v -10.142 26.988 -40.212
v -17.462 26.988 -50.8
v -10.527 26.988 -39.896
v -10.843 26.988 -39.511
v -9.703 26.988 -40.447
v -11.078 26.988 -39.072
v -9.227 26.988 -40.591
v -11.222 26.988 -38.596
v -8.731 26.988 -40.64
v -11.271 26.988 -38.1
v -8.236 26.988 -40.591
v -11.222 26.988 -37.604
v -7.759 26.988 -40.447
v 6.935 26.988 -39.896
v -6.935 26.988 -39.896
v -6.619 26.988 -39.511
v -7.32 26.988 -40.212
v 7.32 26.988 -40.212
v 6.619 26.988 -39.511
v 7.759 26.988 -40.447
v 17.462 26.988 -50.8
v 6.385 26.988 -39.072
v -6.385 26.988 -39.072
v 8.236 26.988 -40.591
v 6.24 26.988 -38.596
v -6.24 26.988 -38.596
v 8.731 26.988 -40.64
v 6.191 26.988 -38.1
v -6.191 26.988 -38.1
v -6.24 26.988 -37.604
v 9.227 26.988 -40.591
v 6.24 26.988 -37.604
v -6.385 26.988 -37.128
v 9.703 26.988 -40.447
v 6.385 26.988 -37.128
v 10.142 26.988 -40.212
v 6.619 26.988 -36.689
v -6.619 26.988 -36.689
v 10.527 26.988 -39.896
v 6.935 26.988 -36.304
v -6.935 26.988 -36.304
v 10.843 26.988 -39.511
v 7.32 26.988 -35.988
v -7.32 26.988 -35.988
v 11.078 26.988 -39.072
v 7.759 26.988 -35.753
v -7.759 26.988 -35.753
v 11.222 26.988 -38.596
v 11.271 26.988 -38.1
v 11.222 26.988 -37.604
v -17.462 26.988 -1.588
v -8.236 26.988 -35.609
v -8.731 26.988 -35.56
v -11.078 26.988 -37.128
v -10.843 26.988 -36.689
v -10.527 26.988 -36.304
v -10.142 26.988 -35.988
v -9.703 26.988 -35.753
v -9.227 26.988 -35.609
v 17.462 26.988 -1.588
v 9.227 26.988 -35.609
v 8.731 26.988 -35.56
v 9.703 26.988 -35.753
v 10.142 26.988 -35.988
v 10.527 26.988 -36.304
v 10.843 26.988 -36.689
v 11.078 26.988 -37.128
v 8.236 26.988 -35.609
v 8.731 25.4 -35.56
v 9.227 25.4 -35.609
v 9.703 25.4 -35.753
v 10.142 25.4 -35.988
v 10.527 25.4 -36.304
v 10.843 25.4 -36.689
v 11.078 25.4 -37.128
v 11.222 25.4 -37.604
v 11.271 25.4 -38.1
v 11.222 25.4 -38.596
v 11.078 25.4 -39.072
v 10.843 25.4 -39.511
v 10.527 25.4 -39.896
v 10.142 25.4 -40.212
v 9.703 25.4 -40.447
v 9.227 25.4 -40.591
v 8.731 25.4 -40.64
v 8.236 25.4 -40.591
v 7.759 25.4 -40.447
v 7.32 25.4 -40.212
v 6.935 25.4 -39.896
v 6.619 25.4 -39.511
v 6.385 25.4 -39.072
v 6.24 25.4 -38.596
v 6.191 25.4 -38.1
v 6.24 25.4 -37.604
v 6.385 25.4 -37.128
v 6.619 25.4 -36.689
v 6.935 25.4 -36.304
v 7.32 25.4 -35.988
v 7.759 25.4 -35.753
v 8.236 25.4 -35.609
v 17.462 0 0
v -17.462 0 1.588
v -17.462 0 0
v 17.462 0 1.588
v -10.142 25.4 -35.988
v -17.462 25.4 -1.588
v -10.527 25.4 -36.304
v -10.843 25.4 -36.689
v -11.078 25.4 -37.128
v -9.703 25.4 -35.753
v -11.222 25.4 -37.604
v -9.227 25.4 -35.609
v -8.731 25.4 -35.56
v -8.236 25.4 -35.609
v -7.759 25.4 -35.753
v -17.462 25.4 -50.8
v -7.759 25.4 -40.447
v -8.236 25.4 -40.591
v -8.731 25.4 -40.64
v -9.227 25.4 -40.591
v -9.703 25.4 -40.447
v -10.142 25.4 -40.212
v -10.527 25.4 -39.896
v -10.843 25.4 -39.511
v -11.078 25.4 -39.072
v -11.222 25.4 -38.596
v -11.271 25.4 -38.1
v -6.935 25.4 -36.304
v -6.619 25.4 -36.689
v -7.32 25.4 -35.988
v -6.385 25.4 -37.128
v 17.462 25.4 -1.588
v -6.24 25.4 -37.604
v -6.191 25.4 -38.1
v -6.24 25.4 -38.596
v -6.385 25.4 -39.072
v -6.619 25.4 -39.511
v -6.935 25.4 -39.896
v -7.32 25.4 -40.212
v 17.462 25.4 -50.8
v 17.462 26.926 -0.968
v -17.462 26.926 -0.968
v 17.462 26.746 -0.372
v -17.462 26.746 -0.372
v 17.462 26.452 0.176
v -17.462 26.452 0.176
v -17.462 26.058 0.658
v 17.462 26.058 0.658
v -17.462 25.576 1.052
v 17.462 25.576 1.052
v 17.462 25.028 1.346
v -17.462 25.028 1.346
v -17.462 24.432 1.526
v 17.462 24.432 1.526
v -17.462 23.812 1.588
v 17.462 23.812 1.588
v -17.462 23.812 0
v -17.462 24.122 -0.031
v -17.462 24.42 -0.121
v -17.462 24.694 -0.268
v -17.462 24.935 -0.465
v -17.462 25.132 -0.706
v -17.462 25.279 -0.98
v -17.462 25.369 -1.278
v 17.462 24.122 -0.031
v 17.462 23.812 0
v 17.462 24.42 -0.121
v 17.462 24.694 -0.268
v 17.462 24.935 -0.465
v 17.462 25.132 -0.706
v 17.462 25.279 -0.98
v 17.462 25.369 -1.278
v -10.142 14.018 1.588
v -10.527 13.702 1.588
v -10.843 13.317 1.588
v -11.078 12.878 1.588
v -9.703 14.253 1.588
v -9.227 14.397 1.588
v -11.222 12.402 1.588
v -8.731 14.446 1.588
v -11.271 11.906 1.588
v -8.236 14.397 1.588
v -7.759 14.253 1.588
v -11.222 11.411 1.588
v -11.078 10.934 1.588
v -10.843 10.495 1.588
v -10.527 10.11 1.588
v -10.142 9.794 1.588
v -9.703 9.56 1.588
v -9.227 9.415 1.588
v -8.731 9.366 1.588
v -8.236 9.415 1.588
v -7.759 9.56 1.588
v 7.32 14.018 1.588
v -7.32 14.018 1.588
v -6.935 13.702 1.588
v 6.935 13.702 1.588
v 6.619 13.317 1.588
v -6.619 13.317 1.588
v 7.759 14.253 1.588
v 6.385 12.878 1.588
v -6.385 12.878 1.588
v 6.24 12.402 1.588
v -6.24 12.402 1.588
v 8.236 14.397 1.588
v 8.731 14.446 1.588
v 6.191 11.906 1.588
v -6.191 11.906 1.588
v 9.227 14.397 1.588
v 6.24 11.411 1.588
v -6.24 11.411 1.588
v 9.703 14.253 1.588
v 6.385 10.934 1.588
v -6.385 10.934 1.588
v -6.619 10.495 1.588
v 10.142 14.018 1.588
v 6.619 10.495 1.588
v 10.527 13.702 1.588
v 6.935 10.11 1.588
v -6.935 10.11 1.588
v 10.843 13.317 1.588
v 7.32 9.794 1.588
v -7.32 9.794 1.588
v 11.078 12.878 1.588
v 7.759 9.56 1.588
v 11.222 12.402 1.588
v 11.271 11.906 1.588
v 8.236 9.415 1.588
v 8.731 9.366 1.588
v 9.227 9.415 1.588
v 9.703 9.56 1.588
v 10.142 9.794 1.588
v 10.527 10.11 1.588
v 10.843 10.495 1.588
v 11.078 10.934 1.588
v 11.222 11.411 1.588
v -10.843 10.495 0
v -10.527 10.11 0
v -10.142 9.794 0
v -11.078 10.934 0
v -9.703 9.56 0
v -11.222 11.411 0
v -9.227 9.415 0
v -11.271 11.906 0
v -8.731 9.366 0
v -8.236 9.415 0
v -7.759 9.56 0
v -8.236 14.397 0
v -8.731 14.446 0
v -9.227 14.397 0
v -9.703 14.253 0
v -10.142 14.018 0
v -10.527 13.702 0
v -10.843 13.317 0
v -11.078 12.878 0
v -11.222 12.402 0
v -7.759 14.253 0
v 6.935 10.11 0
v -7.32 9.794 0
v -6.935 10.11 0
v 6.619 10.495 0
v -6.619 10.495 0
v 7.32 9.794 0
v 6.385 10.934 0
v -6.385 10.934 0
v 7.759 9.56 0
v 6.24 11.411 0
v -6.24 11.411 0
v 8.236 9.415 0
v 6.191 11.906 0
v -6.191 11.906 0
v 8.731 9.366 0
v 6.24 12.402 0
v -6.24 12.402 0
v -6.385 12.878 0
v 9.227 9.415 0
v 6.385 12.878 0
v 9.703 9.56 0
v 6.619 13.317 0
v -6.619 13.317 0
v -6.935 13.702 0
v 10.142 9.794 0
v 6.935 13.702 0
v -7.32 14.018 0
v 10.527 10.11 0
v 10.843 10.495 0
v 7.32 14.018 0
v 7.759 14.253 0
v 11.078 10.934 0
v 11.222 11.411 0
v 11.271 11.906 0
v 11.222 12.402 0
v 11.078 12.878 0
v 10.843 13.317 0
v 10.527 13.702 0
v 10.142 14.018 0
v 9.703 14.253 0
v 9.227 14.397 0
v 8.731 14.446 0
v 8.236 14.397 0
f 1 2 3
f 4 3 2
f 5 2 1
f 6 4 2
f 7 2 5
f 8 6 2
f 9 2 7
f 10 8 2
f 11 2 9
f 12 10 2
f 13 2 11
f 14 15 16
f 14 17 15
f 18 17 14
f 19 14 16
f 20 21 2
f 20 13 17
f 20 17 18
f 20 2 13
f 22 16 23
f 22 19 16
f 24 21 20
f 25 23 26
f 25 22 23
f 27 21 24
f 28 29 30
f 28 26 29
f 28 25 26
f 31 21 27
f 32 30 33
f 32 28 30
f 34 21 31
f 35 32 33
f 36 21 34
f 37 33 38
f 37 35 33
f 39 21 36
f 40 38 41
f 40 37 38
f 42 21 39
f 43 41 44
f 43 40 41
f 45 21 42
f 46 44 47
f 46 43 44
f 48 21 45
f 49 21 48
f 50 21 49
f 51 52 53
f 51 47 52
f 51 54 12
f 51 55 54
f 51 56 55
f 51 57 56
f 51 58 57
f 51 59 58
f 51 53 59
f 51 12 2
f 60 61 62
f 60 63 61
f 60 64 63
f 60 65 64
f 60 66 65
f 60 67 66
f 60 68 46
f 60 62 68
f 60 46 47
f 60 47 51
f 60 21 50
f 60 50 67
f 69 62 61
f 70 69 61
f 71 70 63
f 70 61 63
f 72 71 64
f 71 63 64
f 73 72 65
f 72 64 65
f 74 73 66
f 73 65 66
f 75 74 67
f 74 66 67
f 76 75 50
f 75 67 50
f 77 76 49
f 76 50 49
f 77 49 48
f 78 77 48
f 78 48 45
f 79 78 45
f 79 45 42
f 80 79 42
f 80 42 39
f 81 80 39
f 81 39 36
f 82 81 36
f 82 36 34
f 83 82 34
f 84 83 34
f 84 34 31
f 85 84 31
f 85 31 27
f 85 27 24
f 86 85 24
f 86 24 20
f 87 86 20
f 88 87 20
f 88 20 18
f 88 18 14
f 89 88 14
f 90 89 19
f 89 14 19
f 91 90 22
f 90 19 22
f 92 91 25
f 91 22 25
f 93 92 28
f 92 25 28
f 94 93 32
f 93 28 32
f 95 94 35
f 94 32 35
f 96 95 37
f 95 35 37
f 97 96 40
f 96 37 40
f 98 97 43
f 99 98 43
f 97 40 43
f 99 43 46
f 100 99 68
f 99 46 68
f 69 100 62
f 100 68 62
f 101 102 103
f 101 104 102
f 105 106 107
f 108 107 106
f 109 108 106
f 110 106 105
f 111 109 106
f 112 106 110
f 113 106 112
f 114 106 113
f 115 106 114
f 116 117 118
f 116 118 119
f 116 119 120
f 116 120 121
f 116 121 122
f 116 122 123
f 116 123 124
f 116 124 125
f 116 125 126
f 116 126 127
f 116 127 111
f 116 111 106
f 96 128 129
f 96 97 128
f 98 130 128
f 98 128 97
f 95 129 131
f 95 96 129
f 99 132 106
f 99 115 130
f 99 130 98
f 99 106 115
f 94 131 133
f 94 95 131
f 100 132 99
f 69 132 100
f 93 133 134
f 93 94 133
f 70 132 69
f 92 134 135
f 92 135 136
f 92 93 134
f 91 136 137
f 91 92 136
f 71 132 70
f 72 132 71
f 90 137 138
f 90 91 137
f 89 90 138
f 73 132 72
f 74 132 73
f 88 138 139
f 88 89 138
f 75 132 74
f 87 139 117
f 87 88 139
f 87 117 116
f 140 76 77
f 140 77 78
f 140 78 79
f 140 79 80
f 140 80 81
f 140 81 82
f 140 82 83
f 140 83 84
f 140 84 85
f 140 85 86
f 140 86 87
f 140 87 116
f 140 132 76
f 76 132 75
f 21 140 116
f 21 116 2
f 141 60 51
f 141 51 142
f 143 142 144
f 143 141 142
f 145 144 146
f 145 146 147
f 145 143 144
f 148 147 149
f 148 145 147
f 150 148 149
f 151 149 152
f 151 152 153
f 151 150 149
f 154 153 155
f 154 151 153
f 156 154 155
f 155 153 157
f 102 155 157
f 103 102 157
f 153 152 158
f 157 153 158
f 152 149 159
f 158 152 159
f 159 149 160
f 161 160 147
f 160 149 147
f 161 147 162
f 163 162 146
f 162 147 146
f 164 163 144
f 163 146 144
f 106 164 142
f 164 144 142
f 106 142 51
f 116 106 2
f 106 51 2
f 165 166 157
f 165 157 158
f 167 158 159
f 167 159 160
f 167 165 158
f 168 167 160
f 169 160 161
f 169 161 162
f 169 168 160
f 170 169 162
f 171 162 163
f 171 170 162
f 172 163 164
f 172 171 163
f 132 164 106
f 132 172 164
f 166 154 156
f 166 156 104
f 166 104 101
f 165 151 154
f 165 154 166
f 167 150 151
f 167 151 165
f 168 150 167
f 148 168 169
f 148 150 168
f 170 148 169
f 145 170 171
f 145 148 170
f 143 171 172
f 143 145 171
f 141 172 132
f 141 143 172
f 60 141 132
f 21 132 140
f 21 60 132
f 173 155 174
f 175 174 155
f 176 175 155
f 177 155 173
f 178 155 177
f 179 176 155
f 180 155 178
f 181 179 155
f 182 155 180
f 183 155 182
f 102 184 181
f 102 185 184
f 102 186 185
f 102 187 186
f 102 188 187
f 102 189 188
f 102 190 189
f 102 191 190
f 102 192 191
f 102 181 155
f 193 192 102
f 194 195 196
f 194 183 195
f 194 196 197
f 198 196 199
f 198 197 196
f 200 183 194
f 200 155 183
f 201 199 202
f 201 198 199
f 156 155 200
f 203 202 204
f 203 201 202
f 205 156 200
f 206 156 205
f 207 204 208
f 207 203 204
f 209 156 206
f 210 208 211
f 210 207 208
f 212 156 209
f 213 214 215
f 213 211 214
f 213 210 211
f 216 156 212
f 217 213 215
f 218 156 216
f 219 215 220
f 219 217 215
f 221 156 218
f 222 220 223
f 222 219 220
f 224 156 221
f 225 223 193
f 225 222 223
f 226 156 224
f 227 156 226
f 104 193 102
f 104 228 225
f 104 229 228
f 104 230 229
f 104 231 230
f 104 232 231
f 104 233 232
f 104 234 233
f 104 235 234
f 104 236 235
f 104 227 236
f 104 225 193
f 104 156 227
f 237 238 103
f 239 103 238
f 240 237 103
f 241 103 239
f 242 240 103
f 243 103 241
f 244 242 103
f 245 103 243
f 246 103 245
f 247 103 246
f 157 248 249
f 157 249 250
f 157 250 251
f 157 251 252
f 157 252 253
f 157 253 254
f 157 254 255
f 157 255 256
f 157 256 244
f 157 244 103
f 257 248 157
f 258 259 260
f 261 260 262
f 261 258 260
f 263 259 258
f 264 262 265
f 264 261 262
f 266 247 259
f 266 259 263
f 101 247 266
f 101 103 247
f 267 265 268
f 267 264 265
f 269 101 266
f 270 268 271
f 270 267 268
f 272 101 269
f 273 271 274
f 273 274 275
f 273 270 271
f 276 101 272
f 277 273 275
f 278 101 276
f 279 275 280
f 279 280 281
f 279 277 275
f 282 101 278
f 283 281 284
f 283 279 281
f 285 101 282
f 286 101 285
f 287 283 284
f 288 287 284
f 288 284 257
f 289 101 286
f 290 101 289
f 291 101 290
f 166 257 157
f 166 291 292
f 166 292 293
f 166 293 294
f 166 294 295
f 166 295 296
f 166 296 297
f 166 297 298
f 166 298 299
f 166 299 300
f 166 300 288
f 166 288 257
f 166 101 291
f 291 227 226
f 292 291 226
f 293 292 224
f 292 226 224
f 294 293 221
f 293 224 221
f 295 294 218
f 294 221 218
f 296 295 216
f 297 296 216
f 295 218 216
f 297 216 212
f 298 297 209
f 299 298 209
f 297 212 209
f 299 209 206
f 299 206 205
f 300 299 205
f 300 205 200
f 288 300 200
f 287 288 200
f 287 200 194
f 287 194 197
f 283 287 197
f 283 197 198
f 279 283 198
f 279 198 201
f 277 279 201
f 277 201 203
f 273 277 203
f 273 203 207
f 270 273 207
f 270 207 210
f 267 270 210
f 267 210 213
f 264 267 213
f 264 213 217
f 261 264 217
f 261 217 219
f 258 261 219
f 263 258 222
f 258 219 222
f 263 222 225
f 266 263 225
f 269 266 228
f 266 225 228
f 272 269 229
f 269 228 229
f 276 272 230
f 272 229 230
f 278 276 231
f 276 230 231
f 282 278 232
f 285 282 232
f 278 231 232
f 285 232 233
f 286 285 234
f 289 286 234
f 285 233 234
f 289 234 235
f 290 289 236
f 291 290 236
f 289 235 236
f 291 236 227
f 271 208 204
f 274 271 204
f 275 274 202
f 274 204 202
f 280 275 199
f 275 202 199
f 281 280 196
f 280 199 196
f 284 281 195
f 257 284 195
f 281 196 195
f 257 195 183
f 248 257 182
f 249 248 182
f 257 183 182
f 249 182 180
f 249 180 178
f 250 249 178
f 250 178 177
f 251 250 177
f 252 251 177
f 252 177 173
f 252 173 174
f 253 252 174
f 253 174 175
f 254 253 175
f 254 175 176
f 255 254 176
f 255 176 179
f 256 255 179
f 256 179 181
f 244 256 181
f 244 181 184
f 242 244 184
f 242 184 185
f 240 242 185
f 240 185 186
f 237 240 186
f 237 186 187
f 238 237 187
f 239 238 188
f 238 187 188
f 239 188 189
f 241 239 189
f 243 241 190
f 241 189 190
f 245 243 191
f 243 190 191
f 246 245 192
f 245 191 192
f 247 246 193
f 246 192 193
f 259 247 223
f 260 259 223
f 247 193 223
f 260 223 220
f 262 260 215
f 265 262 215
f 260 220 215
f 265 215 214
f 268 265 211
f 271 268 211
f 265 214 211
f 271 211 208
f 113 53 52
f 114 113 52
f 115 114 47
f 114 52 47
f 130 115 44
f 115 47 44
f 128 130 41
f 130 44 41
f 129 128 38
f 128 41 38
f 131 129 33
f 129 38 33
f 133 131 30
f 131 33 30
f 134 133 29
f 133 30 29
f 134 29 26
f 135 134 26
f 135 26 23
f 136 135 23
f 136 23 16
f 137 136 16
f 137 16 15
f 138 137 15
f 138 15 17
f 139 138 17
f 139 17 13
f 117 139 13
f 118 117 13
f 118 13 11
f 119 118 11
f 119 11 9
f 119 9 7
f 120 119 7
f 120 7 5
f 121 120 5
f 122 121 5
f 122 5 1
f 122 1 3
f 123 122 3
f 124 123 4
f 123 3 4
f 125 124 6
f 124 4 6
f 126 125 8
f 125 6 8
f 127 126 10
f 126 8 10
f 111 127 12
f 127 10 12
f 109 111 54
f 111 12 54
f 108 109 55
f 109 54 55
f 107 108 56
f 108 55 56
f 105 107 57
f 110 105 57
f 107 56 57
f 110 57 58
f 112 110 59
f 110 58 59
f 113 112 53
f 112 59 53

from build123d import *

# Parameters (mm, degrees)
BASE_FLANGE1_DEPTH = 17.4625
SKETCH6_R          = 2.54
CUT_EXTRUDE1_DEPTH = 2.54
SKETCH7_R          = 2.54
CUT_EXTRUDE2_DEPTH = 2.54


# Sheet-metal steps are written as plain solids
with BuildPart() as part:
    # Sketch1 → Base-Flange1 (new, symmetric)
    with BuildSketch(Plane(origin=(0, 0, 0), x_dir=(0, 0, -1), z_dir=(1, 0, 0))):
        with BuildLine():
            Line((0, 0), (0, 23.8125))
            ThreePointArc((0, 23.8125), (0.464967985, 24.935032015), (1.5875, 25.4))
            Line((1.5875, 25.4), (50.8, 25.4))
            Line((50.8, 25.4), (50.8, 26.9875))
            Line((50.8, 26.9875), (1.5875, 26.9875))
            ThreePointArc((1.5875, 26.9875), (-0.65756403, 26.05756403), (-1.5875, 23.8125))
            Line((-1.5875, 23.8125), (-1.5875, 0))
            Line((-1.5875, 0), (0, 0))
        make_face()
    extrude(amount=BASE_FLANGE1_DEPTH, both=True)

    # Sketch6 → Cut-Extrude1 (cut)
    with BuildSketch(Plane.XY.offset(1.5875)):
        with Locations((-8.73125, 11.90625)):
            Circle(SKETCH6_R)
        with Locations((8.73125, 11.90625)):
            Circle(SKETCH6_R)
    extrude(amount=-CUT_EXTRUDE1_DEPTH, mode=Mode.SUBTRACT)

    # Sketch7 → Cut-Extrude2 (cut)
    with BuildSketch(Plane(origin=(0, 26.9875, 0), x_dir=(1, 0, 0), z_dir=(0, 1, 0))):
        with Locations(Location((-8.73125, 38.1, 0), (0, 0, 270))):
            Circle(SKETCH7_R)
        with Locations(Location((8.73125, 38.1, 0), (0, 0, 270))):
            Circle(SKETCH7_R)
    extrude(amount=-CUT_EXTRUDE2_DEPTH, mode=Mode.SUBTRACT)


solid = part.part
